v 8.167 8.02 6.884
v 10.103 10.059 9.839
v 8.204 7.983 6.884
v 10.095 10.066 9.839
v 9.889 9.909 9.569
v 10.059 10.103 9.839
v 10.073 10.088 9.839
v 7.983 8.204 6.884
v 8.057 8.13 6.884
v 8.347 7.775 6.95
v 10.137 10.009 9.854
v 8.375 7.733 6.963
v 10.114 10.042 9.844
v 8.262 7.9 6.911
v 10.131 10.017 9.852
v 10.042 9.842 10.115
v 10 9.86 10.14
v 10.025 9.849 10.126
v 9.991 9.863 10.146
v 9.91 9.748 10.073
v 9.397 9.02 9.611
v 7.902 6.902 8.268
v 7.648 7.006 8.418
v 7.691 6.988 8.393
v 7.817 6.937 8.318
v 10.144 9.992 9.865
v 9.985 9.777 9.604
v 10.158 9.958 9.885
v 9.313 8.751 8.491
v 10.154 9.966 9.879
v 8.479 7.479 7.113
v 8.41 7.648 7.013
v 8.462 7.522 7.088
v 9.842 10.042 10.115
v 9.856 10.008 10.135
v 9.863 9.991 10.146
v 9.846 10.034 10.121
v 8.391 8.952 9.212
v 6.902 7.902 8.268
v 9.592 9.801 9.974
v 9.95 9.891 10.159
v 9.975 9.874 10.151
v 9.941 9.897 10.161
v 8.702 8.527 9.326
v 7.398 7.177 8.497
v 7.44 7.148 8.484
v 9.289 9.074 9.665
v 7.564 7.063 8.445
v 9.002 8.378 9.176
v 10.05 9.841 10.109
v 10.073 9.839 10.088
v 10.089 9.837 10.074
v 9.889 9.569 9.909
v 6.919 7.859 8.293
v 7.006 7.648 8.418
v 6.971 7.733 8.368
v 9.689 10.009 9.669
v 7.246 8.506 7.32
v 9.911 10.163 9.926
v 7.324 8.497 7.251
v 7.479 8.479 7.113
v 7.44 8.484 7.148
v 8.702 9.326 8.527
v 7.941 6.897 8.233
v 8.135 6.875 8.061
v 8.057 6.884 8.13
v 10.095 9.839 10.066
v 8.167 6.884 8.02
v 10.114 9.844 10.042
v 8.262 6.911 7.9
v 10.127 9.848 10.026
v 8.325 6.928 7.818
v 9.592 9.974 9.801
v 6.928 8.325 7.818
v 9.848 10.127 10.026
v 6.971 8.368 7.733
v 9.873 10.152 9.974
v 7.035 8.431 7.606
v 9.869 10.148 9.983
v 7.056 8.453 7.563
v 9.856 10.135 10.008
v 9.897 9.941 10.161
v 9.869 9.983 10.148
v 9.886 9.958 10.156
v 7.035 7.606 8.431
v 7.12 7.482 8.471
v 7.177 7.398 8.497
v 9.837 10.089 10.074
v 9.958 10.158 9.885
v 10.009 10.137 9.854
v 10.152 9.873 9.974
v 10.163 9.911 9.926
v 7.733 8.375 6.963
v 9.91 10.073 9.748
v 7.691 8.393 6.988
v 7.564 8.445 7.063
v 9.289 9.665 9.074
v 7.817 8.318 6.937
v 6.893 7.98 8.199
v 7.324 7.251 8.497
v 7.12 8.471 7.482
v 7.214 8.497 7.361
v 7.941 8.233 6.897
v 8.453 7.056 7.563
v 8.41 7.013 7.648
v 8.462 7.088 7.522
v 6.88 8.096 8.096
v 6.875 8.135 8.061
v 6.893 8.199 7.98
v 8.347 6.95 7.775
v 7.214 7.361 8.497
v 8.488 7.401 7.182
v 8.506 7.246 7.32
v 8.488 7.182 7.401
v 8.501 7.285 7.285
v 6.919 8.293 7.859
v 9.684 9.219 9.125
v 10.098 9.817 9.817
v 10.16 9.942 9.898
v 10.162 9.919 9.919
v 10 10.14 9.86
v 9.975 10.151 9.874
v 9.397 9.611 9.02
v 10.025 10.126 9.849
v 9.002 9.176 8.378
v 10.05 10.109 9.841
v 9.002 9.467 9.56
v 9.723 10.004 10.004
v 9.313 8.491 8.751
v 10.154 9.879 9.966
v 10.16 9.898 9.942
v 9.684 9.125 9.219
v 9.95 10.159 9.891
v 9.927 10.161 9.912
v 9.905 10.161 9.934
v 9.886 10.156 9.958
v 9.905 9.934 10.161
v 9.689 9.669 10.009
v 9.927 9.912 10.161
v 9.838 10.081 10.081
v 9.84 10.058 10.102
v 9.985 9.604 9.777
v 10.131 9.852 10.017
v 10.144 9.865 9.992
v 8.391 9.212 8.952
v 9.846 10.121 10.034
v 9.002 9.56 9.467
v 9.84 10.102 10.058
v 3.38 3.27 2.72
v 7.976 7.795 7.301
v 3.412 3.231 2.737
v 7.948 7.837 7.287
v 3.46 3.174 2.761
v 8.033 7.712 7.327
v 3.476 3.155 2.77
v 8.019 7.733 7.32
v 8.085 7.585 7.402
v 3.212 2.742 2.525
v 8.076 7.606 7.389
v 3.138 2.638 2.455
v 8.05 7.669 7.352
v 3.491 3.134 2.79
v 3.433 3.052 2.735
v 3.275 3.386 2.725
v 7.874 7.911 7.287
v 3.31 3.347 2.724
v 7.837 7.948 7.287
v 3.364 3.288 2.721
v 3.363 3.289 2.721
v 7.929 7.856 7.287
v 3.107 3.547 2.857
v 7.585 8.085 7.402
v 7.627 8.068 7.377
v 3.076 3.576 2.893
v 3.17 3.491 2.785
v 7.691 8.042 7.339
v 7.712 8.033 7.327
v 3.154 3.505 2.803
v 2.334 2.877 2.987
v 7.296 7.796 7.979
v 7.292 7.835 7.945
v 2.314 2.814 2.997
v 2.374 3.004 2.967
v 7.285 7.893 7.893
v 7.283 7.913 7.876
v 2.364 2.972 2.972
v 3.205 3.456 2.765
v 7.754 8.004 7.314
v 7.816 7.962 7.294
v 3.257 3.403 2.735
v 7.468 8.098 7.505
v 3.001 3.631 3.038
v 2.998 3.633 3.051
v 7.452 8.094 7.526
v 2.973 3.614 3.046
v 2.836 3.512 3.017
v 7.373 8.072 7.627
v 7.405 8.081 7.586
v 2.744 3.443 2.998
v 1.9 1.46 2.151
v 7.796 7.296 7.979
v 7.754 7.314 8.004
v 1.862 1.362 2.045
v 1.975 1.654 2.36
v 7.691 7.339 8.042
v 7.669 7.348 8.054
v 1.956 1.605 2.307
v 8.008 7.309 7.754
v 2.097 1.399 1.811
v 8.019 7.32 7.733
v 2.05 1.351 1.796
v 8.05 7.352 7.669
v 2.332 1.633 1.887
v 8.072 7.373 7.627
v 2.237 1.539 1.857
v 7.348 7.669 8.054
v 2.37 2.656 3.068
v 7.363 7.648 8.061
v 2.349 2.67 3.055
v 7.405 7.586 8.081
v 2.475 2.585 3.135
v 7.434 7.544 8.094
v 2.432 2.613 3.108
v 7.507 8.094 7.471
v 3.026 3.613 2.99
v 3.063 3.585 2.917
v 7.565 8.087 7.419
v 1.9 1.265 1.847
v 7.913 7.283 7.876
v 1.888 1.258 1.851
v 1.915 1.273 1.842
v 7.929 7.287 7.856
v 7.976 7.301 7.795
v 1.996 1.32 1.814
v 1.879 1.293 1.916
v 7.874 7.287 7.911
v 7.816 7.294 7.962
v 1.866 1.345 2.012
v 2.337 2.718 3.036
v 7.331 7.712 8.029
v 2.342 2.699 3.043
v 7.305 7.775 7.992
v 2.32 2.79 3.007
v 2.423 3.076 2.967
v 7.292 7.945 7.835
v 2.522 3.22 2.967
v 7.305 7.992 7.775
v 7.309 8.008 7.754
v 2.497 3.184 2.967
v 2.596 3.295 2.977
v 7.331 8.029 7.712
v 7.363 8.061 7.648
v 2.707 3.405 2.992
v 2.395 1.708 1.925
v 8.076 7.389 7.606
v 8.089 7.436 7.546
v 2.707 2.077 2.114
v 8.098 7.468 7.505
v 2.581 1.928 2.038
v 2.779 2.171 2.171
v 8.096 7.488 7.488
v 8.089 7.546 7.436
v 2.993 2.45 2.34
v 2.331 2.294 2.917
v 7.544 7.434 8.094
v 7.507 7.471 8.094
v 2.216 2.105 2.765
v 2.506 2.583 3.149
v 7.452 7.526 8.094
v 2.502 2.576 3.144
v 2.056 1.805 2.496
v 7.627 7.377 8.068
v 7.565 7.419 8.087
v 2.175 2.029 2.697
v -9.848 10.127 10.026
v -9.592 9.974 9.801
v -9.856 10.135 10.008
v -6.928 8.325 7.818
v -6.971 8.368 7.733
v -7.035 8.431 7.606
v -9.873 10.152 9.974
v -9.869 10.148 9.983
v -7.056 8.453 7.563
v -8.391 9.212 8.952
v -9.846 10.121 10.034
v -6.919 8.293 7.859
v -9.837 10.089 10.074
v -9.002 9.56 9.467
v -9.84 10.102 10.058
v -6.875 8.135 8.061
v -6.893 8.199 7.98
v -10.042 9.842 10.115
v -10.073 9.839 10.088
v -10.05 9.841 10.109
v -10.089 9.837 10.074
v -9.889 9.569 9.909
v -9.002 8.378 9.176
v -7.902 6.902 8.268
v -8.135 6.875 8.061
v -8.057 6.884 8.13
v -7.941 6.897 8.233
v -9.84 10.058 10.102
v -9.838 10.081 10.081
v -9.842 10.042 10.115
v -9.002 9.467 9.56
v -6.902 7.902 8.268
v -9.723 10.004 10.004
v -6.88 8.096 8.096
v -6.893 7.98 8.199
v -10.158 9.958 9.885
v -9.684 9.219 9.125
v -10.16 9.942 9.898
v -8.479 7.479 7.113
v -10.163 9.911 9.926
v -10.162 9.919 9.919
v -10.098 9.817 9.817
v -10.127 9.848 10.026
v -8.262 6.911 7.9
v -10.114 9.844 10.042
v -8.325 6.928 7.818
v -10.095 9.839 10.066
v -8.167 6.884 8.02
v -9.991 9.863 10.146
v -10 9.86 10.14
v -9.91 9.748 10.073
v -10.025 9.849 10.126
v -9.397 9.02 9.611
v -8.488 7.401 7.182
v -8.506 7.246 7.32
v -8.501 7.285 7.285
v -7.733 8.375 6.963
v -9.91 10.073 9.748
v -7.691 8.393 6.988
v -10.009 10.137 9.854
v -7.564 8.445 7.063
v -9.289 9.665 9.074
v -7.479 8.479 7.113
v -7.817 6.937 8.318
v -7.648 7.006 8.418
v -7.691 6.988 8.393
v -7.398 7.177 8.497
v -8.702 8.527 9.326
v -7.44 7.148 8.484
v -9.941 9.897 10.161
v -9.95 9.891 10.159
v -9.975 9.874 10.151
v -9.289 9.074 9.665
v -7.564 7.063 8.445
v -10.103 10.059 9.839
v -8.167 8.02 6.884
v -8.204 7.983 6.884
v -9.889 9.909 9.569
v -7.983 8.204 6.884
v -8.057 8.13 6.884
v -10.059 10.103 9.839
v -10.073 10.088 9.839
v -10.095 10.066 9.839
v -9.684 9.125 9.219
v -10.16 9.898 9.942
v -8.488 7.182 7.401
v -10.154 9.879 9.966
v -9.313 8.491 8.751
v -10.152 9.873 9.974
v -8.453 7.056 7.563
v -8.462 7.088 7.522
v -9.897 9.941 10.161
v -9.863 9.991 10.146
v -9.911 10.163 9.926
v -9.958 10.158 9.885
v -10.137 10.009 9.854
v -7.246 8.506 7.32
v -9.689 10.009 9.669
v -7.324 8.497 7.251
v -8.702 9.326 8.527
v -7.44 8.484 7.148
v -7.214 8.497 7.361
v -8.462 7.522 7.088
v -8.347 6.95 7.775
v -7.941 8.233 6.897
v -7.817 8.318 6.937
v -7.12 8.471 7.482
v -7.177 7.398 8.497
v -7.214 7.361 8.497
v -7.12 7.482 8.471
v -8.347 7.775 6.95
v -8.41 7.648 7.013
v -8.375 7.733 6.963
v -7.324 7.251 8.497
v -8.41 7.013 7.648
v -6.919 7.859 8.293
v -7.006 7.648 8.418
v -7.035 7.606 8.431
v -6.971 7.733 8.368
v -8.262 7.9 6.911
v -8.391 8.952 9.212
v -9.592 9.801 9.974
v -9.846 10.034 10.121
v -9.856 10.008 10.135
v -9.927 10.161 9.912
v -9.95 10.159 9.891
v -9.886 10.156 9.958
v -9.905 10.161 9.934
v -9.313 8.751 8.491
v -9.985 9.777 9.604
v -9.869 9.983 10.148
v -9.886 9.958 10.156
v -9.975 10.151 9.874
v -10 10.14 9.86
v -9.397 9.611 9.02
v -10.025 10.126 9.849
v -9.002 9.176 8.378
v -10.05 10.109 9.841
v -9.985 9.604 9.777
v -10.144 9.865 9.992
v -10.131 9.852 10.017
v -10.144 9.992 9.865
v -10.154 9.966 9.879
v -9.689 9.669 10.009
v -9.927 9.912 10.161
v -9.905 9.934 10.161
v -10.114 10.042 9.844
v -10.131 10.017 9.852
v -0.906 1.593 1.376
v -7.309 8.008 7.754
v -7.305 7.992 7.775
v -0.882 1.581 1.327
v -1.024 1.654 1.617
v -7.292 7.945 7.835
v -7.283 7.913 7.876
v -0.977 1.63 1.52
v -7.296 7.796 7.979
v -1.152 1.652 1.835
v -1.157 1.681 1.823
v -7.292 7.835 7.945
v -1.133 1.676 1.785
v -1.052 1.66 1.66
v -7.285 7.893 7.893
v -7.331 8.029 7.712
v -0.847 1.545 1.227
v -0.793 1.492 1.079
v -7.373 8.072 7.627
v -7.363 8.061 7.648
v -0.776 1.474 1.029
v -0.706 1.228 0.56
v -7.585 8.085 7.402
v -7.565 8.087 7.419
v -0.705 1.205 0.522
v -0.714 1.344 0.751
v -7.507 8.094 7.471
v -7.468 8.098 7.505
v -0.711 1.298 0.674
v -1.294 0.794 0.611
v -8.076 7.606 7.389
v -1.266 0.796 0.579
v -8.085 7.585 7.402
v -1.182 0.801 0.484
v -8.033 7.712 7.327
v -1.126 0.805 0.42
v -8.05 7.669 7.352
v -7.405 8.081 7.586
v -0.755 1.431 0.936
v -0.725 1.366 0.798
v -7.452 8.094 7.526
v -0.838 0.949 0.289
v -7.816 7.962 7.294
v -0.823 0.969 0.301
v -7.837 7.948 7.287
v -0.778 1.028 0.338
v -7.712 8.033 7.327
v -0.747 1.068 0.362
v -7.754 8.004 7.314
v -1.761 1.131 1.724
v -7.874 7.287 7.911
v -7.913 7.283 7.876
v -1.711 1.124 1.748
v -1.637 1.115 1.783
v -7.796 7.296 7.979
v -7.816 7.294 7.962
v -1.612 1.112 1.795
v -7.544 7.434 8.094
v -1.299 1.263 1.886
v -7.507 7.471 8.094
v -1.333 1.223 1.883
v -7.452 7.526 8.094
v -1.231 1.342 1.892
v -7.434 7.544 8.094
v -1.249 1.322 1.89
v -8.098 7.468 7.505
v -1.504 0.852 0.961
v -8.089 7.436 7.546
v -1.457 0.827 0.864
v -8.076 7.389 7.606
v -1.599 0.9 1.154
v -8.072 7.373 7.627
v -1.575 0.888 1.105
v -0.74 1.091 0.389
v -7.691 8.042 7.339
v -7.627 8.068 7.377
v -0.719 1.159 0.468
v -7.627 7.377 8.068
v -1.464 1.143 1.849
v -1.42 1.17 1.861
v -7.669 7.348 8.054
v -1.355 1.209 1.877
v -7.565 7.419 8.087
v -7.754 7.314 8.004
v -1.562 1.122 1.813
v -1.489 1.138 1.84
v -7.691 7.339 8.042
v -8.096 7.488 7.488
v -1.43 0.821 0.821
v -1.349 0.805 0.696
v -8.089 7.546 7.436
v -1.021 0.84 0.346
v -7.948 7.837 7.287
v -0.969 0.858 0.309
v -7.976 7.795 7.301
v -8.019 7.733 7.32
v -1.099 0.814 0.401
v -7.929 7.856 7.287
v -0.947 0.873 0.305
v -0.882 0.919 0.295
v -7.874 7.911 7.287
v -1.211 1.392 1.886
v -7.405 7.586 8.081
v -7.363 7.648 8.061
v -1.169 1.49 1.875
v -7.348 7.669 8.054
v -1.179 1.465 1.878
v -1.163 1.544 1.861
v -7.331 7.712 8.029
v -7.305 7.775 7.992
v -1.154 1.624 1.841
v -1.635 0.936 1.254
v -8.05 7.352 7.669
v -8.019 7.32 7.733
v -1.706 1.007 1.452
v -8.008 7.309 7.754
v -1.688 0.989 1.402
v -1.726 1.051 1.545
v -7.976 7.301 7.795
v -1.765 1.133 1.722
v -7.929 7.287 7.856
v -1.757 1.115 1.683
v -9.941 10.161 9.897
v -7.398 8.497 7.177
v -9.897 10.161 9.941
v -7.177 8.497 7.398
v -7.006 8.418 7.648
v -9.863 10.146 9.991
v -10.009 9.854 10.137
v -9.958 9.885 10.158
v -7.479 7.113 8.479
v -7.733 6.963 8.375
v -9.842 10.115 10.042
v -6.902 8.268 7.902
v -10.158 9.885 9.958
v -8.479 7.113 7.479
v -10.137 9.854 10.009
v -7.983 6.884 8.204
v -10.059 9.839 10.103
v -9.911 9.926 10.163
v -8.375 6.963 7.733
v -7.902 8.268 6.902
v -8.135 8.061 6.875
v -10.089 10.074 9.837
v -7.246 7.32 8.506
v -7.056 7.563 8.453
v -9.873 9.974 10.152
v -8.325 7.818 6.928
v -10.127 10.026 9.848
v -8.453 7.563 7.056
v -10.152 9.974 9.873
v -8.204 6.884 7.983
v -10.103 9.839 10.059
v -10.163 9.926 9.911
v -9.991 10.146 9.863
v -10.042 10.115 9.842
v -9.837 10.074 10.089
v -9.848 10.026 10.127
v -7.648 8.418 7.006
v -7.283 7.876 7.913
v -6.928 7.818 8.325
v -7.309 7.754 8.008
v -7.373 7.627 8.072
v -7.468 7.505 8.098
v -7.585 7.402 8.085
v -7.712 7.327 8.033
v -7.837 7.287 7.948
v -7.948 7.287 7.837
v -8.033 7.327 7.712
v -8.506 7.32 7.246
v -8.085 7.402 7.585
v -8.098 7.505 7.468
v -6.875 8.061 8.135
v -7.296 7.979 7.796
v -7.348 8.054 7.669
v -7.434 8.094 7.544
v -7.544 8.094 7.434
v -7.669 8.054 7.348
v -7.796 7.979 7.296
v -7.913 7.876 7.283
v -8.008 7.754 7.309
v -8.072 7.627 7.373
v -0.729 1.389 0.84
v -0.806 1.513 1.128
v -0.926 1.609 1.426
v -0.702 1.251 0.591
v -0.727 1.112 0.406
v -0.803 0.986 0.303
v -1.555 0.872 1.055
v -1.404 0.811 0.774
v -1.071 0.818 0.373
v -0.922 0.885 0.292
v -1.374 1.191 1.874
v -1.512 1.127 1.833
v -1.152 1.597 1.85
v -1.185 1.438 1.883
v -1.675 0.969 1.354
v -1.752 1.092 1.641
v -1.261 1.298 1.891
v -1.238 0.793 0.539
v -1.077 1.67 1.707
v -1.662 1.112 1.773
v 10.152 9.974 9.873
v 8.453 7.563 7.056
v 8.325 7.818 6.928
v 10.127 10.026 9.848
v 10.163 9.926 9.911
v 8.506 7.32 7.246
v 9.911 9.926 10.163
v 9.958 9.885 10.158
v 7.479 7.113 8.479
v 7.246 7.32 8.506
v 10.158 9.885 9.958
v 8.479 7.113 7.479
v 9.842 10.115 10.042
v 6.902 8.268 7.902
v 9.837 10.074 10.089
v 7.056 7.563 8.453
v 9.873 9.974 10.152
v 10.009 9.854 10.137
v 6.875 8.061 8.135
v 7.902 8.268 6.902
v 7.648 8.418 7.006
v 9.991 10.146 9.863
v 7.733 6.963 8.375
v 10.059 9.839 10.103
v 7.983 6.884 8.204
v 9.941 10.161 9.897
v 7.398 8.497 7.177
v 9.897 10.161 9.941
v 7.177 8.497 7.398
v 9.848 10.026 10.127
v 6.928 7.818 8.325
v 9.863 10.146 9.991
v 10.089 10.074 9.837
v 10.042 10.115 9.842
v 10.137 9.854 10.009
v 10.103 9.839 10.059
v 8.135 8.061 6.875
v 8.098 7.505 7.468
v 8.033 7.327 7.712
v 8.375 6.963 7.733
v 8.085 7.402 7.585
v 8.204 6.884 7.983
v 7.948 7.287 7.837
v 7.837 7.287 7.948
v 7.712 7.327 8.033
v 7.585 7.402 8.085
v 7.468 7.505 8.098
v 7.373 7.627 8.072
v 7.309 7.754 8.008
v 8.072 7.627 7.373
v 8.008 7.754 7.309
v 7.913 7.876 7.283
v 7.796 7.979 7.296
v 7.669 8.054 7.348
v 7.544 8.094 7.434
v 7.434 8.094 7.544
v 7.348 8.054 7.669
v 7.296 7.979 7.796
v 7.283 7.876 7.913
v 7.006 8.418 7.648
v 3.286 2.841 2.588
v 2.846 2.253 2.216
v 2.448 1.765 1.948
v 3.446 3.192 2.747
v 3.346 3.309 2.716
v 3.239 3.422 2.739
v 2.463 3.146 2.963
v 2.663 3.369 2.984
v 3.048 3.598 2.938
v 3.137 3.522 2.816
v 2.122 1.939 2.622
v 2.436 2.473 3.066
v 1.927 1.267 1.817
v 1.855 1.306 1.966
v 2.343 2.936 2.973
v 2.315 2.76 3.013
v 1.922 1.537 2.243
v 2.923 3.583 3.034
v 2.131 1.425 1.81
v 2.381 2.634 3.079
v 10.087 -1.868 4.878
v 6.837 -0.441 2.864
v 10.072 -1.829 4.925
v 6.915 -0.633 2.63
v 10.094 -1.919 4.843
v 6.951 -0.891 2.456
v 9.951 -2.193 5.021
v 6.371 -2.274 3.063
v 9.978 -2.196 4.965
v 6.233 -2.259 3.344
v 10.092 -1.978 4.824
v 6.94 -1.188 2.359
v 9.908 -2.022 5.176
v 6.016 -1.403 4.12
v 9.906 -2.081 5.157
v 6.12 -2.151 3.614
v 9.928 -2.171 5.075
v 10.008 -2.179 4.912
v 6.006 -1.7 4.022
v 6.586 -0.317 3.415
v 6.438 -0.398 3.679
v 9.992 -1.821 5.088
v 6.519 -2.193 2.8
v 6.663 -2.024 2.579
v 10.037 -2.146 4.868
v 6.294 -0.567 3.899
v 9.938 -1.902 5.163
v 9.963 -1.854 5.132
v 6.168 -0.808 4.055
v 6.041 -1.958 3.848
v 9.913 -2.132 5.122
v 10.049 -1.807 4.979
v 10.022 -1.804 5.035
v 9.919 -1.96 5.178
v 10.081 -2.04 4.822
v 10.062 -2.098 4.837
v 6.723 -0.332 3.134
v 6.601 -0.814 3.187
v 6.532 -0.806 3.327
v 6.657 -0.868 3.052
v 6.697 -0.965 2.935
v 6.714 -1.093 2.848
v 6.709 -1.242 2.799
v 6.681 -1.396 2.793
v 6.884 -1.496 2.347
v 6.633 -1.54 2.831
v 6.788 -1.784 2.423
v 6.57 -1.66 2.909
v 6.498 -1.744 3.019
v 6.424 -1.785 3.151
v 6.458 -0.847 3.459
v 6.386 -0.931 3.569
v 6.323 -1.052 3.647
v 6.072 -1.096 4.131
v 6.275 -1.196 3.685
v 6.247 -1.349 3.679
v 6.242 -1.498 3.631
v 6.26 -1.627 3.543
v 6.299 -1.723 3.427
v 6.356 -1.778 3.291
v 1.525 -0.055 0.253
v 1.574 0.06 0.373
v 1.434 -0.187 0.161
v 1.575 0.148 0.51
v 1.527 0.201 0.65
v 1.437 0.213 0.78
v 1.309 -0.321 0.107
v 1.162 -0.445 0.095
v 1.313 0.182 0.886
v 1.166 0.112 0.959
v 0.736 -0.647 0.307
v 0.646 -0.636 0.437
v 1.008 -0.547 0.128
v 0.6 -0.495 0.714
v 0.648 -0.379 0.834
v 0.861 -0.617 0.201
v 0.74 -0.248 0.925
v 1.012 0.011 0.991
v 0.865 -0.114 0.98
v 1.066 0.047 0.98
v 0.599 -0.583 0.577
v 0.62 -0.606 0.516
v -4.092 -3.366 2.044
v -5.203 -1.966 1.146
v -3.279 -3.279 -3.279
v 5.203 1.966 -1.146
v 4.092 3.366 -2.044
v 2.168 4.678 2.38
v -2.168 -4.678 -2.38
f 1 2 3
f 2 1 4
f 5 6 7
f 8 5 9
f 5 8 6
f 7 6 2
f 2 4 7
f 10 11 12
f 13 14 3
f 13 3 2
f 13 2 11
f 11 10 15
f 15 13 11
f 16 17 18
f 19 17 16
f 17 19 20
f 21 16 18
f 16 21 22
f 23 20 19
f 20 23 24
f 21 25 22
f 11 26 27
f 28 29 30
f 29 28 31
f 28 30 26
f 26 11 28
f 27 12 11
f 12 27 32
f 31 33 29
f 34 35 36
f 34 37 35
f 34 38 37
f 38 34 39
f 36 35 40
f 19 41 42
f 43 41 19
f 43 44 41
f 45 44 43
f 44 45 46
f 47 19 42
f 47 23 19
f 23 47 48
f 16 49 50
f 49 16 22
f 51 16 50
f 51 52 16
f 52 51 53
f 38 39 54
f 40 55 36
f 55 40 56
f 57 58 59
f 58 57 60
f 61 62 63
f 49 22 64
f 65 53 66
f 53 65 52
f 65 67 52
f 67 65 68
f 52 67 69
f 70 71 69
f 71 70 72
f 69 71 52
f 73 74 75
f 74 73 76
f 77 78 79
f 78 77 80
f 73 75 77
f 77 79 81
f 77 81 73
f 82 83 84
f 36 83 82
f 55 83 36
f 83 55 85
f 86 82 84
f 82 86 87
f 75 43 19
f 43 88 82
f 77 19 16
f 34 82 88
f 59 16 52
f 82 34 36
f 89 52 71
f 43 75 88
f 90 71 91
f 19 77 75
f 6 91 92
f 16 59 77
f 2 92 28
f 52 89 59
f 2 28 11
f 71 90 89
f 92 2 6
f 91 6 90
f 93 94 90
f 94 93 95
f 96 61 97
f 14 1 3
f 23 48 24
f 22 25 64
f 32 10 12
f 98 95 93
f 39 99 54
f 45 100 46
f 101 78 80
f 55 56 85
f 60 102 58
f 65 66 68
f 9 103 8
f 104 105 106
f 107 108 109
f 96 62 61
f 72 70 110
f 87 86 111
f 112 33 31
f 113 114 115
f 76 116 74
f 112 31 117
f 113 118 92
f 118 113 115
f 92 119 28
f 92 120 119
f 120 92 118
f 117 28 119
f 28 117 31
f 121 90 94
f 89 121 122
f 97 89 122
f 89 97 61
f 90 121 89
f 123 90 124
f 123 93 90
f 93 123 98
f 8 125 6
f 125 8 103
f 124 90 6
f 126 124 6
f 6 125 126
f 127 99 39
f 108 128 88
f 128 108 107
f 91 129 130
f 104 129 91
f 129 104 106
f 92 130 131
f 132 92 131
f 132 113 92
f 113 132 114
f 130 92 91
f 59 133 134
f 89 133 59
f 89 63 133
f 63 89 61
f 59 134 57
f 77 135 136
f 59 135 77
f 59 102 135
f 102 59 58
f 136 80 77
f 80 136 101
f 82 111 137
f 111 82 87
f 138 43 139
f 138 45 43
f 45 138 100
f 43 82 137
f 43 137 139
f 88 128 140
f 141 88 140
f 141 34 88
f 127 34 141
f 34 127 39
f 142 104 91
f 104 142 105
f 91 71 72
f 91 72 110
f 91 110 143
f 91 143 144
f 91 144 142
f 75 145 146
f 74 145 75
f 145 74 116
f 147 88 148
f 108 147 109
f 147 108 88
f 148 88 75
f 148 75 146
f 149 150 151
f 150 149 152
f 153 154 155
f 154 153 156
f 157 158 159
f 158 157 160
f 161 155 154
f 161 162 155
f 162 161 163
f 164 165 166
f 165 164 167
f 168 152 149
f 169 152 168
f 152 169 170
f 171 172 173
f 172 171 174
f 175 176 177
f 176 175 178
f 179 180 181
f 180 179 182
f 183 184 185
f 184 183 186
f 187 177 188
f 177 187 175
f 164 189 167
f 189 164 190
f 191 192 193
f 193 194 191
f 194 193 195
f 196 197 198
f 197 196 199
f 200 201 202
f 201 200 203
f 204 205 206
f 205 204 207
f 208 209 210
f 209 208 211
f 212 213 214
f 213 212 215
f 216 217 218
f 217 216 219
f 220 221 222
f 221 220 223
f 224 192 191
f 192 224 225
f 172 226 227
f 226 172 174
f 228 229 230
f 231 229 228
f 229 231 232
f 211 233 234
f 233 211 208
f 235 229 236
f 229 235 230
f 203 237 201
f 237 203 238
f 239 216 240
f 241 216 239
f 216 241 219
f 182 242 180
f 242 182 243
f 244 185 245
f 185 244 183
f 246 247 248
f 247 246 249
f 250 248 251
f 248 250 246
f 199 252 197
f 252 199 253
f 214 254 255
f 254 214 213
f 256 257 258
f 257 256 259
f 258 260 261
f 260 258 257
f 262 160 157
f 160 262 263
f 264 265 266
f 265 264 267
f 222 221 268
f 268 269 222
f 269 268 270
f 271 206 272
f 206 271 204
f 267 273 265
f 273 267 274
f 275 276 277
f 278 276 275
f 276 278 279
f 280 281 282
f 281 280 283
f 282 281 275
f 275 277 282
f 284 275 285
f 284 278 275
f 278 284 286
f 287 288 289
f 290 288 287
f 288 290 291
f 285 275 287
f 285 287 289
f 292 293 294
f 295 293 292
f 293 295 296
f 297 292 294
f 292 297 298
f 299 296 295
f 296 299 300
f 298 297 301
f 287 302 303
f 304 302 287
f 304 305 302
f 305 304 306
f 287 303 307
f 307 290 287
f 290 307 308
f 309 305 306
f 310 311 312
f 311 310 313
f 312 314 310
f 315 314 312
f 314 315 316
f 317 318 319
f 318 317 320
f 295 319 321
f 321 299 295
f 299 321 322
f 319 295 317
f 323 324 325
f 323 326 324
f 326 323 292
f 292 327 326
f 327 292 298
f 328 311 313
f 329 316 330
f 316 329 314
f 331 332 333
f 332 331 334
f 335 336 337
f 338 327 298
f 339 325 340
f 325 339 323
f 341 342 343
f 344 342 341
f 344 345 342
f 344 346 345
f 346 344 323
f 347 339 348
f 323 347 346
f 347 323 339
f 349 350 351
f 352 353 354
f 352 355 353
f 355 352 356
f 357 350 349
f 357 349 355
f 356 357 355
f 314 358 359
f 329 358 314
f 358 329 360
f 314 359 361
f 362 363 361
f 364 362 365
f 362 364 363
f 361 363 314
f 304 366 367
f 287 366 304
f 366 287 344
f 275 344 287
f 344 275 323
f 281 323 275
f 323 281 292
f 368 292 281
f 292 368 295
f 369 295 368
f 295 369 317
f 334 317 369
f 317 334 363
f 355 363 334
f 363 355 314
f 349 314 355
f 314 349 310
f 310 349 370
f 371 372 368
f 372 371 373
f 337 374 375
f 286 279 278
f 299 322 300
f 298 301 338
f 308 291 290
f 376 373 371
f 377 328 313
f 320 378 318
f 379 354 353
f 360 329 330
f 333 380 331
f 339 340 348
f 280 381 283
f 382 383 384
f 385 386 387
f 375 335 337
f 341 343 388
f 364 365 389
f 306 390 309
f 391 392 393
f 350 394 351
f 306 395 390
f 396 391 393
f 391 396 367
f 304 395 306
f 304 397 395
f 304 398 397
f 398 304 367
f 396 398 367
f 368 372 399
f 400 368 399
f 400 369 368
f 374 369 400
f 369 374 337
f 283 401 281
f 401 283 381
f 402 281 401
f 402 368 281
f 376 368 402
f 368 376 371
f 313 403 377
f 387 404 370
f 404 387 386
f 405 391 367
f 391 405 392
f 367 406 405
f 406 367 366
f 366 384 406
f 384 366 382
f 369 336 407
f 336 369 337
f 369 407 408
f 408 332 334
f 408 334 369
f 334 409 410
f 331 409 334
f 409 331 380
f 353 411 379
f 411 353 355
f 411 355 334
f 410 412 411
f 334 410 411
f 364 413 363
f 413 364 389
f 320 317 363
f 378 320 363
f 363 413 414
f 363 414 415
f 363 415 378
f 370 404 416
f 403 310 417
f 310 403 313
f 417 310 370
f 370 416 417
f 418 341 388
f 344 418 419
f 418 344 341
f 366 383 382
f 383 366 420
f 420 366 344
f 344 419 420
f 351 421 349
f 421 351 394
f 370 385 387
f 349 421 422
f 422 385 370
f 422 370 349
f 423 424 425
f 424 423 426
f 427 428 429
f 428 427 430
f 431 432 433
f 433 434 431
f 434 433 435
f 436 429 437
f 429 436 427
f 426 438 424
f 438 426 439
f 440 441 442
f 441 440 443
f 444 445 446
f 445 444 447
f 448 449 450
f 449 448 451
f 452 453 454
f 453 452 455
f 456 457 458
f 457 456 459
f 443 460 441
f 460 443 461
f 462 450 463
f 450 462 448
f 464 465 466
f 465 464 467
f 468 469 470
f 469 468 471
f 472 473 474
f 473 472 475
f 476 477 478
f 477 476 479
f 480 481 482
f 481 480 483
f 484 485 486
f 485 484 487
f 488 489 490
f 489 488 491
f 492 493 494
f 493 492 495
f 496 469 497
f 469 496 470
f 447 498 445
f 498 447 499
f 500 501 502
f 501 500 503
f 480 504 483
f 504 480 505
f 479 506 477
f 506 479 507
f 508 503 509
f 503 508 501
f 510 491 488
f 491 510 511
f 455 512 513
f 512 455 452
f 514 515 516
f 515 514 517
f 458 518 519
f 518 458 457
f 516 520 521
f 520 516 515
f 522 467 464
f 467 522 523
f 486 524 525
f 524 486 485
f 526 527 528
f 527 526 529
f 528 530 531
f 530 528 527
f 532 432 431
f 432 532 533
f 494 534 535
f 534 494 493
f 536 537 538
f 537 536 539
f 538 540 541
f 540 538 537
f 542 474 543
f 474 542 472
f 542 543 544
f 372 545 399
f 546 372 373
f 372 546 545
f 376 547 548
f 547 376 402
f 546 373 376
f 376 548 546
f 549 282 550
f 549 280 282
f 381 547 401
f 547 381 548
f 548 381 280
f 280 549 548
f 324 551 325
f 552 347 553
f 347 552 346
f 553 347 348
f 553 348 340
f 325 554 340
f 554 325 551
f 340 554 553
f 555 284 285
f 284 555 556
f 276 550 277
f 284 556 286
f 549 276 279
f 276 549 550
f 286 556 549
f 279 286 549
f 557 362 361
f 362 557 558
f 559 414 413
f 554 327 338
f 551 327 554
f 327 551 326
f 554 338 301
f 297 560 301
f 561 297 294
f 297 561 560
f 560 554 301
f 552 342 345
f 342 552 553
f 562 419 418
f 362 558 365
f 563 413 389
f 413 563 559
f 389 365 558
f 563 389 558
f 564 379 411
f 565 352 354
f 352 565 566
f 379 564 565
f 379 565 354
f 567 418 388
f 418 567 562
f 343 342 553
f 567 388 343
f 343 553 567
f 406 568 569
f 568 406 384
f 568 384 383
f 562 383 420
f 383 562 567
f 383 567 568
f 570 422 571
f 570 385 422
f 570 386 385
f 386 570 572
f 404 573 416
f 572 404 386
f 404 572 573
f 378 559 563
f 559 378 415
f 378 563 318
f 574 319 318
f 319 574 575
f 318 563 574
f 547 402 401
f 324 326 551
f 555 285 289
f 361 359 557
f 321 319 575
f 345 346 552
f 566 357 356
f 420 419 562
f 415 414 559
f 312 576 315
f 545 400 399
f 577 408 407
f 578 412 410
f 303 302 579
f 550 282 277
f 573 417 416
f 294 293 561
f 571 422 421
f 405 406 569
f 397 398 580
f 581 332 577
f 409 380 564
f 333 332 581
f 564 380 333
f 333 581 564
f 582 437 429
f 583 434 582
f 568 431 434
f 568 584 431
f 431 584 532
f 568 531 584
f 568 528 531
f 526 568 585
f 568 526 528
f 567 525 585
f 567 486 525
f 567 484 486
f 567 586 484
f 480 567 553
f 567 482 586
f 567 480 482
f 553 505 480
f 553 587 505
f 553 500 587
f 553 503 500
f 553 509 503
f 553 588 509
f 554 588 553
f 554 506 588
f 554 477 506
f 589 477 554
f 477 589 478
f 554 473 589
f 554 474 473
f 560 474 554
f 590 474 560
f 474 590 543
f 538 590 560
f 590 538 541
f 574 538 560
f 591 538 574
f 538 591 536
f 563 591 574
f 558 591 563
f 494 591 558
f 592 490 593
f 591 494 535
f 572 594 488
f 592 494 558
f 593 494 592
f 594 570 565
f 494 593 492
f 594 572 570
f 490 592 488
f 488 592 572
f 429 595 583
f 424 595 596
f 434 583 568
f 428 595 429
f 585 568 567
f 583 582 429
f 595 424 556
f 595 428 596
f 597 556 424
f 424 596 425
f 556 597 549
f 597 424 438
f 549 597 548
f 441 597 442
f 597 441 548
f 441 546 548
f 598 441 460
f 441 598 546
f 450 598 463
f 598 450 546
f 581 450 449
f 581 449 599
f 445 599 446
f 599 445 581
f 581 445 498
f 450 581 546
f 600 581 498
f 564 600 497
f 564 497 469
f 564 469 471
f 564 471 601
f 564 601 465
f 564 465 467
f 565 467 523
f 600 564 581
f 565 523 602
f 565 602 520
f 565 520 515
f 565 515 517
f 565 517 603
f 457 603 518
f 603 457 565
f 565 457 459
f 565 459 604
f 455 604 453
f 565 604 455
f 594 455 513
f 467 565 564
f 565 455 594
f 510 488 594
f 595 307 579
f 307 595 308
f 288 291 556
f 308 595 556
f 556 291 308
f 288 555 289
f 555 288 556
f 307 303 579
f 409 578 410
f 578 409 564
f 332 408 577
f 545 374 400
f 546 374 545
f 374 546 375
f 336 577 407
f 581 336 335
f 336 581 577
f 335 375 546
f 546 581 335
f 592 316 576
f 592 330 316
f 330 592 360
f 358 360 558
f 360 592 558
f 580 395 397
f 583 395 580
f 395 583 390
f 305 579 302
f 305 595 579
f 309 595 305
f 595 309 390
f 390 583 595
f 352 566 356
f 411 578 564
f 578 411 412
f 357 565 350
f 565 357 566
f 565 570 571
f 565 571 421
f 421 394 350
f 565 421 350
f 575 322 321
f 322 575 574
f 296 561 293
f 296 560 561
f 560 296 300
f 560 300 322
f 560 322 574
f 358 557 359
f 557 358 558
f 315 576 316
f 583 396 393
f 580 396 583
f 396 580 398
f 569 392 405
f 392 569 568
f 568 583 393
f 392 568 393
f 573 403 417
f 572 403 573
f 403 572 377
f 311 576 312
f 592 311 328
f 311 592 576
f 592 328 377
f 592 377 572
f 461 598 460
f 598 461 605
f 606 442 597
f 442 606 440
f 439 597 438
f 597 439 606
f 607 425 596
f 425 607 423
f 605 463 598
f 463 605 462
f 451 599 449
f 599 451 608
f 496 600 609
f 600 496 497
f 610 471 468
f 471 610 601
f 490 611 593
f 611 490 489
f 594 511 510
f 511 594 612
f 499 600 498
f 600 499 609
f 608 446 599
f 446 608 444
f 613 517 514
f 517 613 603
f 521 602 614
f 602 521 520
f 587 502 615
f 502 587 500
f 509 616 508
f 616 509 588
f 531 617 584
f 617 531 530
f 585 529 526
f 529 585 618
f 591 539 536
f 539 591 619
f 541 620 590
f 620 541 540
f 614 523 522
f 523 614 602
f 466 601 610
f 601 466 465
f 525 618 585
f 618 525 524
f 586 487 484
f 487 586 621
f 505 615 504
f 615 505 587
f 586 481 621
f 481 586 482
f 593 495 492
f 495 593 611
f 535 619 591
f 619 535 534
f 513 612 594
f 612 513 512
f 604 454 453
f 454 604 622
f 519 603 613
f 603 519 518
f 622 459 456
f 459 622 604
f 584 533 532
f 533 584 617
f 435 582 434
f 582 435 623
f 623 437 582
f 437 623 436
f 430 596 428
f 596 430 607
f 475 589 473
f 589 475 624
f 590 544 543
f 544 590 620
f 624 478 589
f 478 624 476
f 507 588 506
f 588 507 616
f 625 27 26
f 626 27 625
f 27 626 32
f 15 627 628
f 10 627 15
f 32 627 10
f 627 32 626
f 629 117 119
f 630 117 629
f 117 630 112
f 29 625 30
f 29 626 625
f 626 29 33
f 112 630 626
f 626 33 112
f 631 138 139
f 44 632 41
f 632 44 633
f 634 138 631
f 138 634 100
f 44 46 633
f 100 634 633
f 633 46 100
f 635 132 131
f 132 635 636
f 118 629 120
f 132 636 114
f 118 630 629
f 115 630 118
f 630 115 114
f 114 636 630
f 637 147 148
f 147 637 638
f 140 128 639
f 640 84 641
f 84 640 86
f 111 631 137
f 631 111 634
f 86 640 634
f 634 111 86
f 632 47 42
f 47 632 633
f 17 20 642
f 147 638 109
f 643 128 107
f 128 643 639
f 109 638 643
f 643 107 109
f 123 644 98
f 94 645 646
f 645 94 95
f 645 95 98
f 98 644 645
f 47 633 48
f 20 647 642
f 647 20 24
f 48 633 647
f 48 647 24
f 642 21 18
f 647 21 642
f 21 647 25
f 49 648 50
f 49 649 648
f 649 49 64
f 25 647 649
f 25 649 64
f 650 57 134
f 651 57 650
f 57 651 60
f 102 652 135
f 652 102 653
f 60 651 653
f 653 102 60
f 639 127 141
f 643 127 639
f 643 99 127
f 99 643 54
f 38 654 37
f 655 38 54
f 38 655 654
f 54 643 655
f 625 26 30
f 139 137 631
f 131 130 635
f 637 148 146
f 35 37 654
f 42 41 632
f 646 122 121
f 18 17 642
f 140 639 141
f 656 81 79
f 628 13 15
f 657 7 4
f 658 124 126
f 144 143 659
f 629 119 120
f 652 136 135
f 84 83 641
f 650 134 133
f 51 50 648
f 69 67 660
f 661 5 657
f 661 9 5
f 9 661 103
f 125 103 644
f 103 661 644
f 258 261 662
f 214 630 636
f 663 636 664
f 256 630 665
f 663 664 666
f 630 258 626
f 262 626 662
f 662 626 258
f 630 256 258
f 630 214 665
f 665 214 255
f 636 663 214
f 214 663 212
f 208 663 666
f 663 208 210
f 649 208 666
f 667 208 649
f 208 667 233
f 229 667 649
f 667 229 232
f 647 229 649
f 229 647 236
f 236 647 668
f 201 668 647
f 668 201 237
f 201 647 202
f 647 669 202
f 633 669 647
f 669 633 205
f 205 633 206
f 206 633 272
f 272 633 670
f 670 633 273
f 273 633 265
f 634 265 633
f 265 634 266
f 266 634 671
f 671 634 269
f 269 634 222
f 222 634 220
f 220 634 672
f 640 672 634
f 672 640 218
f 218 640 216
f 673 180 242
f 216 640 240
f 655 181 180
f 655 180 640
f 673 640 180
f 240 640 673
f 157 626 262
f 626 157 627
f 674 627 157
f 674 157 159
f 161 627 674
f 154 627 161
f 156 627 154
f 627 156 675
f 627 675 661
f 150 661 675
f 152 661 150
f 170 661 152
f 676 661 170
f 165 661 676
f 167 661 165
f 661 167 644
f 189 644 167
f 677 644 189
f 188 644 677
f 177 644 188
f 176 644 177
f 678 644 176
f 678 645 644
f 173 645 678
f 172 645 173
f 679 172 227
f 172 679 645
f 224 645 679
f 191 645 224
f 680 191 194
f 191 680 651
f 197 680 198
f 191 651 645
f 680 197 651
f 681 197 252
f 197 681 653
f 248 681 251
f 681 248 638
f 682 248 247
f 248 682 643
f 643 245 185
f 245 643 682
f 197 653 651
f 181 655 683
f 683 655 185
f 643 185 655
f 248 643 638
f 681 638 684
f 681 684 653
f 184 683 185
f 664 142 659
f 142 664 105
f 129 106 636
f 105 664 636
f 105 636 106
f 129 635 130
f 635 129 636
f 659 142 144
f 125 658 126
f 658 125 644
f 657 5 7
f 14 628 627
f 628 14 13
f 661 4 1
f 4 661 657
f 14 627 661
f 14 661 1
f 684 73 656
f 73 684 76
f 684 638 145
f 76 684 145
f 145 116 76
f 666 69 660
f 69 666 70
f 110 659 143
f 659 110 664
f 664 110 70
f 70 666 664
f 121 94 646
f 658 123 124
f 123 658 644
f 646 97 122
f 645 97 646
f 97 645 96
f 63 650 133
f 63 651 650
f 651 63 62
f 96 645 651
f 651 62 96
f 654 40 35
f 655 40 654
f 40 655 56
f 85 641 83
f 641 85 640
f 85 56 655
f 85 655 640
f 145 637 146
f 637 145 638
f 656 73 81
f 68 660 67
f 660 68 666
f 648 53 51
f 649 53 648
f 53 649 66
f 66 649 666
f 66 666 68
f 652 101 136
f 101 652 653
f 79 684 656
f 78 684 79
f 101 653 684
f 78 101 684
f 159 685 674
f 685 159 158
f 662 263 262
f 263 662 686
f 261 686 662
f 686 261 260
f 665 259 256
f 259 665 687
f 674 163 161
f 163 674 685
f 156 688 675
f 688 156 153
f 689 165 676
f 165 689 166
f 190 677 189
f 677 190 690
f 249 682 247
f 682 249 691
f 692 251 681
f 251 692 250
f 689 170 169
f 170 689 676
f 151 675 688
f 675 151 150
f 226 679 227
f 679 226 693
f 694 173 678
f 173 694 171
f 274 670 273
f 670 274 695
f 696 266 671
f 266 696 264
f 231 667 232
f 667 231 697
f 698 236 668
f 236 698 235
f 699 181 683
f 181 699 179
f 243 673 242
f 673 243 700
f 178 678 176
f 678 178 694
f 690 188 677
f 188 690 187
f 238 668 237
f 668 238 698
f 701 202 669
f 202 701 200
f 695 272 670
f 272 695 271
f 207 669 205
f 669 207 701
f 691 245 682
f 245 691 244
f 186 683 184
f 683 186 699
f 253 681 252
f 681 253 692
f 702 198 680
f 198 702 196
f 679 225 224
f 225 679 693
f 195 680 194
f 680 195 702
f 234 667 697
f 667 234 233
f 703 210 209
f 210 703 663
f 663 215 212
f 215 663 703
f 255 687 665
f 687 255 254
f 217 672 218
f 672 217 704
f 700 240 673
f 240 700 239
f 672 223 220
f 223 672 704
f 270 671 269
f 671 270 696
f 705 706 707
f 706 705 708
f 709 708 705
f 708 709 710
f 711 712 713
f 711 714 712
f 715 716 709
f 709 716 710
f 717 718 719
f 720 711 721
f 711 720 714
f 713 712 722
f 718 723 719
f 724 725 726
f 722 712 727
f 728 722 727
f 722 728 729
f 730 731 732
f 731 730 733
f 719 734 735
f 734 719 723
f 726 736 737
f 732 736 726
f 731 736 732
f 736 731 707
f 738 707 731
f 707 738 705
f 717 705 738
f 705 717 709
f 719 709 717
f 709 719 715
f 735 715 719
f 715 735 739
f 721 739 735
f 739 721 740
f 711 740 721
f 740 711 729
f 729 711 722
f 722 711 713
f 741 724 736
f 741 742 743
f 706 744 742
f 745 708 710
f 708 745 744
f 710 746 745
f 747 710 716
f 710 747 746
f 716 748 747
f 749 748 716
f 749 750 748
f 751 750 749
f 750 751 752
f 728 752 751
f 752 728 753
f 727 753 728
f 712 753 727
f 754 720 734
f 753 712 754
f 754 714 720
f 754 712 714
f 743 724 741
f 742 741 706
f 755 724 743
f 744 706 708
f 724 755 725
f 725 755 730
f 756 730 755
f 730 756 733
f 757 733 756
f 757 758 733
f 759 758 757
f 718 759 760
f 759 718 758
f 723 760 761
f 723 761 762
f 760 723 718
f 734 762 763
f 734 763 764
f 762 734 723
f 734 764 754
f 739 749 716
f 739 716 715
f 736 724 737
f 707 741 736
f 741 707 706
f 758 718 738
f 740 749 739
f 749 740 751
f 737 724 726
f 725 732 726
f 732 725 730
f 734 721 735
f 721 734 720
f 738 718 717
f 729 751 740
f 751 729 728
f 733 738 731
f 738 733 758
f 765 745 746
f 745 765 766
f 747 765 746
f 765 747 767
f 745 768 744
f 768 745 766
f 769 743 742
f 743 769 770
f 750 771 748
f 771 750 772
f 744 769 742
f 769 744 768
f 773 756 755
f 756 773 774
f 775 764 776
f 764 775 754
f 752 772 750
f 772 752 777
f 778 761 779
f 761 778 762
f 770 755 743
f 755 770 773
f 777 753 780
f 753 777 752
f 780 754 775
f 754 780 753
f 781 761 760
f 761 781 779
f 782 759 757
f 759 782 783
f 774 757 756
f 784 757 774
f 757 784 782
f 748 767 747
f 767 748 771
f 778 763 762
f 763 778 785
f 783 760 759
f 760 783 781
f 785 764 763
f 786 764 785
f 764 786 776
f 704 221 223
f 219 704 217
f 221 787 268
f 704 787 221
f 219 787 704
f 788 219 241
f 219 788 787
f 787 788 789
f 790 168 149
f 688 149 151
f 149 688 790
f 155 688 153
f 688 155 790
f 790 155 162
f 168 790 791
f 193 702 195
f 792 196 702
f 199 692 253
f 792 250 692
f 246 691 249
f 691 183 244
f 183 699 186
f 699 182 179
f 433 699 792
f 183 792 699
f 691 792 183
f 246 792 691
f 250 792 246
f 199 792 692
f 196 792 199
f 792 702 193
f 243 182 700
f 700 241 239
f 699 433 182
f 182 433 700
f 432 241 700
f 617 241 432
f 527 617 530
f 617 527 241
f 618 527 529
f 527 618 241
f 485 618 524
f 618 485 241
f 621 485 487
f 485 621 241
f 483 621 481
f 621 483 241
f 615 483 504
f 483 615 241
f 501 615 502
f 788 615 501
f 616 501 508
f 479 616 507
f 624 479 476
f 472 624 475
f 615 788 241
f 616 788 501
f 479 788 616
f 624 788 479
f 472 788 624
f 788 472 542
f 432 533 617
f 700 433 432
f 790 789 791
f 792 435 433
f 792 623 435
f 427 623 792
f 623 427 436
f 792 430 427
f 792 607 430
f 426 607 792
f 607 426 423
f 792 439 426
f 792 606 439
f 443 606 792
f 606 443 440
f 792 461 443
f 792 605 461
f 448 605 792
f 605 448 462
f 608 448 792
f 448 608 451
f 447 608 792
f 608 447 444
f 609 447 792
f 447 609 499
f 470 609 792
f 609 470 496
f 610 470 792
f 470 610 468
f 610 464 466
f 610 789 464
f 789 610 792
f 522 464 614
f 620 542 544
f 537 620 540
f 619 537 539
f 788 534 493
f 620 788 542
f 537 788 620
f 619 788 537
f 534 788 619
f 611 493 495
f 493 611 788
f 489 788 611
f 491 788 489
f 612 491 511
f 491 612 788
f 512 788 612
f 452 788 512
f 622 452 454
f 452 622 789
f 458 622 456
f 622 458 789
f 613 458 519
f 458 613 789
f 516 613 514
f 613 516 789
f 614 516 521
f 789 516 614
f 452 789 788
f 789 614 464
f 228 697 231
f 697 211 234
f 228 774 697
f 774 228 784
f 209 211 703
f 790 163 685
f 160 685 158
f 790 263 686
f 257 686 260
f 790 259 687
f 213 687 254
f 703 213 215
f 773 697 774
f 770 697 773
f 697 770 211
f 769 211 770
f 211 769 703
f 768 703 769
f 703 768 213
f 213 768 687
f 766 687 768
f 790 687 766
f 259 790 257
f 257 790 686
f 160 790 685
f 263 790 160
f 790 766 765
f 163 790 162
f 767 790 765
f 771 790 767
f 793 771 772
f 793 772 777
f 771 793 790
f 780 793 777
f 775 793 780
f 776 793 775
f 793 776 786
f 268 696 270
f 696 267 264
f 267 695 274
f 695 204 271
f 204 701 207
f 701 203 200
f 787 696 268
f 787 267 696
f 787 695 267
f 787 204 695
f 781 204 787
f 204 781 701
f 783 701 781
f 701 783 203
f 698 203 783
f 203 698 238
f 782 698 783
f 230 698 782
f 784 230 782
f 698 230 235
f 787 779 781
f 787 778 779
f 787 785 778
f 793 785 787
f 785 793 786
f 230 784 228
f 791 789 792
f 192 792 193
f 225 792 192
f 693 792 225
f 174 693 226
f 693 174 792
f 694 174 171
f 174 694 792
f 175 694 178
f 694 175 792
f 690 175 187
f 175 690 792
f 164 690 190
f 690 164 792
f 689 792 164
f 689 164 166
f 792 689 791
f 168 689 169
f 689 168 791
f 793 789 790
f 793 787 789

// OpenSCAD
//---------------------------------------------------------------
//-- Openscad vector library
//-- This is a component of the obiscad opescad tools by Obijuan
//-- (C) Juan Gonzalez-Gomez (Obijuan)
//-- Sep-2012
//---------------------------------------------------------------
//-- Released under the GPL license
//---------------------------------------------------------------

//----------------------------------------
//-- FUNCTIONS FOR WORKING WITH VECTORS
//----------------------------------------

//-- Calculate the module of a vector
function mod(v) = (sqrt(v[0]*v[0]+v[1]*v[1]+v[2]*v[2]));

//-- Calculate the cros product of two vectors
function cross(u,v) = [
  u[1]*v[2] - v[1]*u[2],
  -(u[0]*v[2] - v[0]*u[2]) ,
  u[0]*v[1] - v[0]*u[1]];

//-- Calculate the dot product of two vectors
function dot(u,v) = u[0]*v[0]+u[1]*v[1]+u[2]*v[2];

//-- Return the unit vector of a vector
function unitv(v) = v/mod(v);

//-- Return the angle between two vectores
function anglev(u,v) = acos( dot(u,v) / (mod(u)*mod(v)) );

//----------------------------------------------------------
//--  Draw a point in the position given by the vector p  
//----------------------------------------------------------
module point(p)
{
  translate(p)
    sphere(r=0.7,$fn=20);
}

//------------------------------------------------------------------
//-- Draw a vector poiting to the z axis
//-- This is an auxiliary module for implementing the vector module
//--
//-- Parameters:
//--  l: total vector length (line + arrow)
//--  l_arrow: Vector arrow length
//--  mark: If true, a mark is draw in the vector head, for having
//--    a visual reference of the rolling angle
//------------------------------------------------------------------
module vectorz(l=10, l_arrow=4, mark=false)
{
  //-- vector body length (not including the arrow)
  lb = l - l_arrow;

  //-- The vector is locatead at 0,0,0
  translate([0,0,lb/2])
  union() {

    //-- Draw the arrow
    translate([0,0,lb/2])
      cylinder(r1=2/2, r2=0.2, h=l_arrow, $fn=20);

    //-- Draw the mark
    if (mark) {
      translate([0,0,lb/2+l_arrow/2])
      translate([1,0,0])
        cube([2,0.3,l_arrow*0.8],center=true);
    }

    //-- Draw the body
    cylinder(r=1/2, h=lb, center=true, $fn=20);
  }

  //-- Draw a sphere in the vector base
  sphere(r=1/2, $fn=20);
}

//-----------------------------------------------------------------
//-- ORIENTATE OPERATOR
//--
//--  Orientate an object to the direction given by the vector v
//--  Parameters:
//--    v : Target orientation
//--    vref: Vector reference. It is the vector of the local frame
//--          of the object that want to be poiting in the direction
//--          of v
//--    roll: Rotation of the object around the v axis
//-------------------------------------------------------------------
module orientate(v,vref=[0,0,1], roll=0)
{
  //-- Calculate the rotation axis
  raxis = cross(vref,v);
  
  //-- Calculate the angle between the vectors
  ang = anglev(vref,v);

  //-- Rotate the child!
  rotate(a=roll, v=v)
    rotate(a=ang, v=raxis)
      child(0);
}

//---------------------------------------------------------------------------
//-- Draw a vector 
//--
//-- There are two modes of drawing the vector
//-- * Mode 1: Given by a cartesian point(x,y,z). A vector from the origin
//--           to the end (x,y,z) is drawn. The l parameter (length) must 
//--           be 0  (l=0)
//-- * Mode 2: Give by direction and length
//--           A vector of length l pointing to the direction given by
//--           v is drawn
//---------------------------------------------------------------------------
//-- Parameters:
//--  v: Vector cartesian coordinates
//--  l: total vector length (line + arrow)
//--  l_arrow: Vector arrow length
//    mark: If true, a mark is draw in the vector head, for having
//--    a visual reference of the rolling angle
//---------------------------------------------------------------------------
module vector(v,l=0, l_arrow=4, mark=false)
{
  //-- Get the vector length from the coordinates
  mod = mod(v);

  //-- The vector is very easy implemented by means of the orientate
  //-- operator:
  //--  orientate(v) vectorz(l=mod, l_arrow=l_arrow)
  //--  BUT... in OPENSCAD 2012.02.22 the recursion does not
  //--    not work, so that if the user use the orientate operator
  //--    on a vector, openscad will ignore it..
  //-- The solution at the moment (I hope the openscad developers
  //--  implement the recursion in the near future...)
  //--  is to repite the orientate operation in this module

  //---- SAME CALCULATIONS THAN THE ORIENTATE OPERATOR!
  //-- Calculate the rotation axis

  vref = [0,0,1];
  raxis = cross(vref,v);
  
  //-- Calculate the angle between the vectors
  ang = anglev(vref,v);

  //-- orientate the vector
  //-- Draw the vector. The vector length is given either
  //--- by the mod variable (when l=0) or by l (when l!=0)
  if (l==0)
    rotate(a=ang, v=raxis)
      vectorz(l=mod, l_arrow=l_arrow, mark=mark);
  else
    rotate(a=ang, v=raxis)
      vectorz(l=l, l_arrow=l_arrow, mark=mark);

}

//----------------------------------------------------
//-- Draw a Frame of reference
//-- Parameters:
//-- l: length of the Unit vectors
//-----------------------------------------------------
module frame(l=10, l_arrow=4)
{

  //-- Z unit vector
  color("Blue")
    vector([0,0,l], l_arrow=l_arrow);

  //-- X unit vector
  color("Red")
    vector([l,0,0], l_arrow=l_arrow );

  //-- Y unit vector
  color("Green")
    vector([0,l,0],l_arrow=l_arrow);

  //-- Origin
  color("Gray")
    sphere(r=1, $fn=20);
}

//--------------------------------------------------
//-- Modules for testings and examples
//-- Testing that the vector library is working ok
//--------------------------------------------------

//-- 22 vectors in total are drawn, poiting to different directions
module Test_vectors1()
{

  a = 20;
  k = 1;

  //--  Add a frame of reference (in the origin)
  frame(l=a);

  //-- Negative vectors, pointing towards the three axis: -x, -y, -z
  color("Red")   vector([-a, 0,  0]);
  color("Green") vector([0, -a,  0]);
  color("Blue")  vector([0,  0, -a]);

  //-- It is *not* has been implemented using a for loop on purpose
  //-- This way, individual vectors can be commented out or highlighted

  //-- vectors with positive z
  vector([a,   a, a*k]);
  vector([0,   a, a*k]);
  vector([-a,  a, a*k]);
  vector([-a,  0, a*k]);

  vector([-a, -a, a*k]);
  vector([0,  -a, a*k]);
  vector([a,  -a, a*k]);
  vector([a,   0, a*k]);


  //-- Vectors with negative z
  vector([a,   a, -a*k]);
  vector([0,   a, -a*k]);
  vector([-a,  a, -a*k]);
  vector([-a,  0, -a*k]);

  vector([-a, -a, -a*k]);
  vector([0,  -a, -a*k]);
  vector([a,  -a, -a*k]);
  vector([a,   0, -a*k]);
}

//--- Another test...
module Test_vectors2()
{

  //-- Add the vector into the vector table
  //-- This vectors are taken as directions
  //-- All the vectors will be drawn with the same length (l)
  vector_table = [
    [1,   1, 1],
    [0,   1, 1],
    [-1,  1, 1],
    [-1,  0, 1],
    [-1, -1, 1],
    [0,  -1, 1],
    [1,  -1, 1],
    [1,   0, 1],
  
    [1,   1, -1],
    [0,   1, -1],
    [-1,  1, -1],
    [-1,  0, -1],
    [-1, -1, -1],
    [0,  -1, -1],
    [1,  -1, -1],
    [1,   0, -1],
  ];

  //-- Vector length
  l=20;

  frame(l=10);

  //-- Draw all the vector given in the table
  //-- The vectors point to the direction given in the table
  //-- They all are drawn with a length equal to l
  for (v=vector_table) {
    //-- Vector given by direction and length
    vector(v,l=l);
  }
}


//-- Test the cross product and the angle
//-- between vectors
module Test_vector3()
{
  //-- Start with 2 unit vectors
  v=unitv([1,1,1]);
  u=unitv([0,1,0]);

  //-- Draw the vector in different colors
  //-- Increase the length for drawing
  color("Red") vector(v*20);
  color("blue") vector(u*20);

  //-- Get the cross product
  w = cross(v,u);
  vector(w*20);

  //-- The cross product is NOT conmutative... 
  //-- change the order of v and u
  w2 = cross(u,v);
  vector(w2*20);

  //-- w should be perpendicular to v and u
  //-- Calculate the angles between them:
  echo("U , V: ", anglev(u,v));
  echo("W , U: ", anglev(w,u));
  echo("W , V: ", anglev(w,v));

}

//-- Test the orientate operator
module Test_vector4()
{
  o = [10,10,10];
  v = [-10,10,10];

  color("Red") vector(o);
  color("Blue") vector(v);

  //-- Orientate the vector o in the direction of v
  orientate(v,o)
    vector(o);

  //-- Inverse operation: orientate the v vector in the direction
  //-- of o
  orientate(o,v)
    vector(v);

  //-- Example of orientation of a cube
  orientate(o,vref=[10,-2,5],roll=0)
    cube([10,2,5],center=true);

  vector([10,-2,5]);

}

//-------- Perform tests......

Test_vector4();


/*

Test_vectors1();


translate([60,0,0]) 
  Test_vectors2();
*/
